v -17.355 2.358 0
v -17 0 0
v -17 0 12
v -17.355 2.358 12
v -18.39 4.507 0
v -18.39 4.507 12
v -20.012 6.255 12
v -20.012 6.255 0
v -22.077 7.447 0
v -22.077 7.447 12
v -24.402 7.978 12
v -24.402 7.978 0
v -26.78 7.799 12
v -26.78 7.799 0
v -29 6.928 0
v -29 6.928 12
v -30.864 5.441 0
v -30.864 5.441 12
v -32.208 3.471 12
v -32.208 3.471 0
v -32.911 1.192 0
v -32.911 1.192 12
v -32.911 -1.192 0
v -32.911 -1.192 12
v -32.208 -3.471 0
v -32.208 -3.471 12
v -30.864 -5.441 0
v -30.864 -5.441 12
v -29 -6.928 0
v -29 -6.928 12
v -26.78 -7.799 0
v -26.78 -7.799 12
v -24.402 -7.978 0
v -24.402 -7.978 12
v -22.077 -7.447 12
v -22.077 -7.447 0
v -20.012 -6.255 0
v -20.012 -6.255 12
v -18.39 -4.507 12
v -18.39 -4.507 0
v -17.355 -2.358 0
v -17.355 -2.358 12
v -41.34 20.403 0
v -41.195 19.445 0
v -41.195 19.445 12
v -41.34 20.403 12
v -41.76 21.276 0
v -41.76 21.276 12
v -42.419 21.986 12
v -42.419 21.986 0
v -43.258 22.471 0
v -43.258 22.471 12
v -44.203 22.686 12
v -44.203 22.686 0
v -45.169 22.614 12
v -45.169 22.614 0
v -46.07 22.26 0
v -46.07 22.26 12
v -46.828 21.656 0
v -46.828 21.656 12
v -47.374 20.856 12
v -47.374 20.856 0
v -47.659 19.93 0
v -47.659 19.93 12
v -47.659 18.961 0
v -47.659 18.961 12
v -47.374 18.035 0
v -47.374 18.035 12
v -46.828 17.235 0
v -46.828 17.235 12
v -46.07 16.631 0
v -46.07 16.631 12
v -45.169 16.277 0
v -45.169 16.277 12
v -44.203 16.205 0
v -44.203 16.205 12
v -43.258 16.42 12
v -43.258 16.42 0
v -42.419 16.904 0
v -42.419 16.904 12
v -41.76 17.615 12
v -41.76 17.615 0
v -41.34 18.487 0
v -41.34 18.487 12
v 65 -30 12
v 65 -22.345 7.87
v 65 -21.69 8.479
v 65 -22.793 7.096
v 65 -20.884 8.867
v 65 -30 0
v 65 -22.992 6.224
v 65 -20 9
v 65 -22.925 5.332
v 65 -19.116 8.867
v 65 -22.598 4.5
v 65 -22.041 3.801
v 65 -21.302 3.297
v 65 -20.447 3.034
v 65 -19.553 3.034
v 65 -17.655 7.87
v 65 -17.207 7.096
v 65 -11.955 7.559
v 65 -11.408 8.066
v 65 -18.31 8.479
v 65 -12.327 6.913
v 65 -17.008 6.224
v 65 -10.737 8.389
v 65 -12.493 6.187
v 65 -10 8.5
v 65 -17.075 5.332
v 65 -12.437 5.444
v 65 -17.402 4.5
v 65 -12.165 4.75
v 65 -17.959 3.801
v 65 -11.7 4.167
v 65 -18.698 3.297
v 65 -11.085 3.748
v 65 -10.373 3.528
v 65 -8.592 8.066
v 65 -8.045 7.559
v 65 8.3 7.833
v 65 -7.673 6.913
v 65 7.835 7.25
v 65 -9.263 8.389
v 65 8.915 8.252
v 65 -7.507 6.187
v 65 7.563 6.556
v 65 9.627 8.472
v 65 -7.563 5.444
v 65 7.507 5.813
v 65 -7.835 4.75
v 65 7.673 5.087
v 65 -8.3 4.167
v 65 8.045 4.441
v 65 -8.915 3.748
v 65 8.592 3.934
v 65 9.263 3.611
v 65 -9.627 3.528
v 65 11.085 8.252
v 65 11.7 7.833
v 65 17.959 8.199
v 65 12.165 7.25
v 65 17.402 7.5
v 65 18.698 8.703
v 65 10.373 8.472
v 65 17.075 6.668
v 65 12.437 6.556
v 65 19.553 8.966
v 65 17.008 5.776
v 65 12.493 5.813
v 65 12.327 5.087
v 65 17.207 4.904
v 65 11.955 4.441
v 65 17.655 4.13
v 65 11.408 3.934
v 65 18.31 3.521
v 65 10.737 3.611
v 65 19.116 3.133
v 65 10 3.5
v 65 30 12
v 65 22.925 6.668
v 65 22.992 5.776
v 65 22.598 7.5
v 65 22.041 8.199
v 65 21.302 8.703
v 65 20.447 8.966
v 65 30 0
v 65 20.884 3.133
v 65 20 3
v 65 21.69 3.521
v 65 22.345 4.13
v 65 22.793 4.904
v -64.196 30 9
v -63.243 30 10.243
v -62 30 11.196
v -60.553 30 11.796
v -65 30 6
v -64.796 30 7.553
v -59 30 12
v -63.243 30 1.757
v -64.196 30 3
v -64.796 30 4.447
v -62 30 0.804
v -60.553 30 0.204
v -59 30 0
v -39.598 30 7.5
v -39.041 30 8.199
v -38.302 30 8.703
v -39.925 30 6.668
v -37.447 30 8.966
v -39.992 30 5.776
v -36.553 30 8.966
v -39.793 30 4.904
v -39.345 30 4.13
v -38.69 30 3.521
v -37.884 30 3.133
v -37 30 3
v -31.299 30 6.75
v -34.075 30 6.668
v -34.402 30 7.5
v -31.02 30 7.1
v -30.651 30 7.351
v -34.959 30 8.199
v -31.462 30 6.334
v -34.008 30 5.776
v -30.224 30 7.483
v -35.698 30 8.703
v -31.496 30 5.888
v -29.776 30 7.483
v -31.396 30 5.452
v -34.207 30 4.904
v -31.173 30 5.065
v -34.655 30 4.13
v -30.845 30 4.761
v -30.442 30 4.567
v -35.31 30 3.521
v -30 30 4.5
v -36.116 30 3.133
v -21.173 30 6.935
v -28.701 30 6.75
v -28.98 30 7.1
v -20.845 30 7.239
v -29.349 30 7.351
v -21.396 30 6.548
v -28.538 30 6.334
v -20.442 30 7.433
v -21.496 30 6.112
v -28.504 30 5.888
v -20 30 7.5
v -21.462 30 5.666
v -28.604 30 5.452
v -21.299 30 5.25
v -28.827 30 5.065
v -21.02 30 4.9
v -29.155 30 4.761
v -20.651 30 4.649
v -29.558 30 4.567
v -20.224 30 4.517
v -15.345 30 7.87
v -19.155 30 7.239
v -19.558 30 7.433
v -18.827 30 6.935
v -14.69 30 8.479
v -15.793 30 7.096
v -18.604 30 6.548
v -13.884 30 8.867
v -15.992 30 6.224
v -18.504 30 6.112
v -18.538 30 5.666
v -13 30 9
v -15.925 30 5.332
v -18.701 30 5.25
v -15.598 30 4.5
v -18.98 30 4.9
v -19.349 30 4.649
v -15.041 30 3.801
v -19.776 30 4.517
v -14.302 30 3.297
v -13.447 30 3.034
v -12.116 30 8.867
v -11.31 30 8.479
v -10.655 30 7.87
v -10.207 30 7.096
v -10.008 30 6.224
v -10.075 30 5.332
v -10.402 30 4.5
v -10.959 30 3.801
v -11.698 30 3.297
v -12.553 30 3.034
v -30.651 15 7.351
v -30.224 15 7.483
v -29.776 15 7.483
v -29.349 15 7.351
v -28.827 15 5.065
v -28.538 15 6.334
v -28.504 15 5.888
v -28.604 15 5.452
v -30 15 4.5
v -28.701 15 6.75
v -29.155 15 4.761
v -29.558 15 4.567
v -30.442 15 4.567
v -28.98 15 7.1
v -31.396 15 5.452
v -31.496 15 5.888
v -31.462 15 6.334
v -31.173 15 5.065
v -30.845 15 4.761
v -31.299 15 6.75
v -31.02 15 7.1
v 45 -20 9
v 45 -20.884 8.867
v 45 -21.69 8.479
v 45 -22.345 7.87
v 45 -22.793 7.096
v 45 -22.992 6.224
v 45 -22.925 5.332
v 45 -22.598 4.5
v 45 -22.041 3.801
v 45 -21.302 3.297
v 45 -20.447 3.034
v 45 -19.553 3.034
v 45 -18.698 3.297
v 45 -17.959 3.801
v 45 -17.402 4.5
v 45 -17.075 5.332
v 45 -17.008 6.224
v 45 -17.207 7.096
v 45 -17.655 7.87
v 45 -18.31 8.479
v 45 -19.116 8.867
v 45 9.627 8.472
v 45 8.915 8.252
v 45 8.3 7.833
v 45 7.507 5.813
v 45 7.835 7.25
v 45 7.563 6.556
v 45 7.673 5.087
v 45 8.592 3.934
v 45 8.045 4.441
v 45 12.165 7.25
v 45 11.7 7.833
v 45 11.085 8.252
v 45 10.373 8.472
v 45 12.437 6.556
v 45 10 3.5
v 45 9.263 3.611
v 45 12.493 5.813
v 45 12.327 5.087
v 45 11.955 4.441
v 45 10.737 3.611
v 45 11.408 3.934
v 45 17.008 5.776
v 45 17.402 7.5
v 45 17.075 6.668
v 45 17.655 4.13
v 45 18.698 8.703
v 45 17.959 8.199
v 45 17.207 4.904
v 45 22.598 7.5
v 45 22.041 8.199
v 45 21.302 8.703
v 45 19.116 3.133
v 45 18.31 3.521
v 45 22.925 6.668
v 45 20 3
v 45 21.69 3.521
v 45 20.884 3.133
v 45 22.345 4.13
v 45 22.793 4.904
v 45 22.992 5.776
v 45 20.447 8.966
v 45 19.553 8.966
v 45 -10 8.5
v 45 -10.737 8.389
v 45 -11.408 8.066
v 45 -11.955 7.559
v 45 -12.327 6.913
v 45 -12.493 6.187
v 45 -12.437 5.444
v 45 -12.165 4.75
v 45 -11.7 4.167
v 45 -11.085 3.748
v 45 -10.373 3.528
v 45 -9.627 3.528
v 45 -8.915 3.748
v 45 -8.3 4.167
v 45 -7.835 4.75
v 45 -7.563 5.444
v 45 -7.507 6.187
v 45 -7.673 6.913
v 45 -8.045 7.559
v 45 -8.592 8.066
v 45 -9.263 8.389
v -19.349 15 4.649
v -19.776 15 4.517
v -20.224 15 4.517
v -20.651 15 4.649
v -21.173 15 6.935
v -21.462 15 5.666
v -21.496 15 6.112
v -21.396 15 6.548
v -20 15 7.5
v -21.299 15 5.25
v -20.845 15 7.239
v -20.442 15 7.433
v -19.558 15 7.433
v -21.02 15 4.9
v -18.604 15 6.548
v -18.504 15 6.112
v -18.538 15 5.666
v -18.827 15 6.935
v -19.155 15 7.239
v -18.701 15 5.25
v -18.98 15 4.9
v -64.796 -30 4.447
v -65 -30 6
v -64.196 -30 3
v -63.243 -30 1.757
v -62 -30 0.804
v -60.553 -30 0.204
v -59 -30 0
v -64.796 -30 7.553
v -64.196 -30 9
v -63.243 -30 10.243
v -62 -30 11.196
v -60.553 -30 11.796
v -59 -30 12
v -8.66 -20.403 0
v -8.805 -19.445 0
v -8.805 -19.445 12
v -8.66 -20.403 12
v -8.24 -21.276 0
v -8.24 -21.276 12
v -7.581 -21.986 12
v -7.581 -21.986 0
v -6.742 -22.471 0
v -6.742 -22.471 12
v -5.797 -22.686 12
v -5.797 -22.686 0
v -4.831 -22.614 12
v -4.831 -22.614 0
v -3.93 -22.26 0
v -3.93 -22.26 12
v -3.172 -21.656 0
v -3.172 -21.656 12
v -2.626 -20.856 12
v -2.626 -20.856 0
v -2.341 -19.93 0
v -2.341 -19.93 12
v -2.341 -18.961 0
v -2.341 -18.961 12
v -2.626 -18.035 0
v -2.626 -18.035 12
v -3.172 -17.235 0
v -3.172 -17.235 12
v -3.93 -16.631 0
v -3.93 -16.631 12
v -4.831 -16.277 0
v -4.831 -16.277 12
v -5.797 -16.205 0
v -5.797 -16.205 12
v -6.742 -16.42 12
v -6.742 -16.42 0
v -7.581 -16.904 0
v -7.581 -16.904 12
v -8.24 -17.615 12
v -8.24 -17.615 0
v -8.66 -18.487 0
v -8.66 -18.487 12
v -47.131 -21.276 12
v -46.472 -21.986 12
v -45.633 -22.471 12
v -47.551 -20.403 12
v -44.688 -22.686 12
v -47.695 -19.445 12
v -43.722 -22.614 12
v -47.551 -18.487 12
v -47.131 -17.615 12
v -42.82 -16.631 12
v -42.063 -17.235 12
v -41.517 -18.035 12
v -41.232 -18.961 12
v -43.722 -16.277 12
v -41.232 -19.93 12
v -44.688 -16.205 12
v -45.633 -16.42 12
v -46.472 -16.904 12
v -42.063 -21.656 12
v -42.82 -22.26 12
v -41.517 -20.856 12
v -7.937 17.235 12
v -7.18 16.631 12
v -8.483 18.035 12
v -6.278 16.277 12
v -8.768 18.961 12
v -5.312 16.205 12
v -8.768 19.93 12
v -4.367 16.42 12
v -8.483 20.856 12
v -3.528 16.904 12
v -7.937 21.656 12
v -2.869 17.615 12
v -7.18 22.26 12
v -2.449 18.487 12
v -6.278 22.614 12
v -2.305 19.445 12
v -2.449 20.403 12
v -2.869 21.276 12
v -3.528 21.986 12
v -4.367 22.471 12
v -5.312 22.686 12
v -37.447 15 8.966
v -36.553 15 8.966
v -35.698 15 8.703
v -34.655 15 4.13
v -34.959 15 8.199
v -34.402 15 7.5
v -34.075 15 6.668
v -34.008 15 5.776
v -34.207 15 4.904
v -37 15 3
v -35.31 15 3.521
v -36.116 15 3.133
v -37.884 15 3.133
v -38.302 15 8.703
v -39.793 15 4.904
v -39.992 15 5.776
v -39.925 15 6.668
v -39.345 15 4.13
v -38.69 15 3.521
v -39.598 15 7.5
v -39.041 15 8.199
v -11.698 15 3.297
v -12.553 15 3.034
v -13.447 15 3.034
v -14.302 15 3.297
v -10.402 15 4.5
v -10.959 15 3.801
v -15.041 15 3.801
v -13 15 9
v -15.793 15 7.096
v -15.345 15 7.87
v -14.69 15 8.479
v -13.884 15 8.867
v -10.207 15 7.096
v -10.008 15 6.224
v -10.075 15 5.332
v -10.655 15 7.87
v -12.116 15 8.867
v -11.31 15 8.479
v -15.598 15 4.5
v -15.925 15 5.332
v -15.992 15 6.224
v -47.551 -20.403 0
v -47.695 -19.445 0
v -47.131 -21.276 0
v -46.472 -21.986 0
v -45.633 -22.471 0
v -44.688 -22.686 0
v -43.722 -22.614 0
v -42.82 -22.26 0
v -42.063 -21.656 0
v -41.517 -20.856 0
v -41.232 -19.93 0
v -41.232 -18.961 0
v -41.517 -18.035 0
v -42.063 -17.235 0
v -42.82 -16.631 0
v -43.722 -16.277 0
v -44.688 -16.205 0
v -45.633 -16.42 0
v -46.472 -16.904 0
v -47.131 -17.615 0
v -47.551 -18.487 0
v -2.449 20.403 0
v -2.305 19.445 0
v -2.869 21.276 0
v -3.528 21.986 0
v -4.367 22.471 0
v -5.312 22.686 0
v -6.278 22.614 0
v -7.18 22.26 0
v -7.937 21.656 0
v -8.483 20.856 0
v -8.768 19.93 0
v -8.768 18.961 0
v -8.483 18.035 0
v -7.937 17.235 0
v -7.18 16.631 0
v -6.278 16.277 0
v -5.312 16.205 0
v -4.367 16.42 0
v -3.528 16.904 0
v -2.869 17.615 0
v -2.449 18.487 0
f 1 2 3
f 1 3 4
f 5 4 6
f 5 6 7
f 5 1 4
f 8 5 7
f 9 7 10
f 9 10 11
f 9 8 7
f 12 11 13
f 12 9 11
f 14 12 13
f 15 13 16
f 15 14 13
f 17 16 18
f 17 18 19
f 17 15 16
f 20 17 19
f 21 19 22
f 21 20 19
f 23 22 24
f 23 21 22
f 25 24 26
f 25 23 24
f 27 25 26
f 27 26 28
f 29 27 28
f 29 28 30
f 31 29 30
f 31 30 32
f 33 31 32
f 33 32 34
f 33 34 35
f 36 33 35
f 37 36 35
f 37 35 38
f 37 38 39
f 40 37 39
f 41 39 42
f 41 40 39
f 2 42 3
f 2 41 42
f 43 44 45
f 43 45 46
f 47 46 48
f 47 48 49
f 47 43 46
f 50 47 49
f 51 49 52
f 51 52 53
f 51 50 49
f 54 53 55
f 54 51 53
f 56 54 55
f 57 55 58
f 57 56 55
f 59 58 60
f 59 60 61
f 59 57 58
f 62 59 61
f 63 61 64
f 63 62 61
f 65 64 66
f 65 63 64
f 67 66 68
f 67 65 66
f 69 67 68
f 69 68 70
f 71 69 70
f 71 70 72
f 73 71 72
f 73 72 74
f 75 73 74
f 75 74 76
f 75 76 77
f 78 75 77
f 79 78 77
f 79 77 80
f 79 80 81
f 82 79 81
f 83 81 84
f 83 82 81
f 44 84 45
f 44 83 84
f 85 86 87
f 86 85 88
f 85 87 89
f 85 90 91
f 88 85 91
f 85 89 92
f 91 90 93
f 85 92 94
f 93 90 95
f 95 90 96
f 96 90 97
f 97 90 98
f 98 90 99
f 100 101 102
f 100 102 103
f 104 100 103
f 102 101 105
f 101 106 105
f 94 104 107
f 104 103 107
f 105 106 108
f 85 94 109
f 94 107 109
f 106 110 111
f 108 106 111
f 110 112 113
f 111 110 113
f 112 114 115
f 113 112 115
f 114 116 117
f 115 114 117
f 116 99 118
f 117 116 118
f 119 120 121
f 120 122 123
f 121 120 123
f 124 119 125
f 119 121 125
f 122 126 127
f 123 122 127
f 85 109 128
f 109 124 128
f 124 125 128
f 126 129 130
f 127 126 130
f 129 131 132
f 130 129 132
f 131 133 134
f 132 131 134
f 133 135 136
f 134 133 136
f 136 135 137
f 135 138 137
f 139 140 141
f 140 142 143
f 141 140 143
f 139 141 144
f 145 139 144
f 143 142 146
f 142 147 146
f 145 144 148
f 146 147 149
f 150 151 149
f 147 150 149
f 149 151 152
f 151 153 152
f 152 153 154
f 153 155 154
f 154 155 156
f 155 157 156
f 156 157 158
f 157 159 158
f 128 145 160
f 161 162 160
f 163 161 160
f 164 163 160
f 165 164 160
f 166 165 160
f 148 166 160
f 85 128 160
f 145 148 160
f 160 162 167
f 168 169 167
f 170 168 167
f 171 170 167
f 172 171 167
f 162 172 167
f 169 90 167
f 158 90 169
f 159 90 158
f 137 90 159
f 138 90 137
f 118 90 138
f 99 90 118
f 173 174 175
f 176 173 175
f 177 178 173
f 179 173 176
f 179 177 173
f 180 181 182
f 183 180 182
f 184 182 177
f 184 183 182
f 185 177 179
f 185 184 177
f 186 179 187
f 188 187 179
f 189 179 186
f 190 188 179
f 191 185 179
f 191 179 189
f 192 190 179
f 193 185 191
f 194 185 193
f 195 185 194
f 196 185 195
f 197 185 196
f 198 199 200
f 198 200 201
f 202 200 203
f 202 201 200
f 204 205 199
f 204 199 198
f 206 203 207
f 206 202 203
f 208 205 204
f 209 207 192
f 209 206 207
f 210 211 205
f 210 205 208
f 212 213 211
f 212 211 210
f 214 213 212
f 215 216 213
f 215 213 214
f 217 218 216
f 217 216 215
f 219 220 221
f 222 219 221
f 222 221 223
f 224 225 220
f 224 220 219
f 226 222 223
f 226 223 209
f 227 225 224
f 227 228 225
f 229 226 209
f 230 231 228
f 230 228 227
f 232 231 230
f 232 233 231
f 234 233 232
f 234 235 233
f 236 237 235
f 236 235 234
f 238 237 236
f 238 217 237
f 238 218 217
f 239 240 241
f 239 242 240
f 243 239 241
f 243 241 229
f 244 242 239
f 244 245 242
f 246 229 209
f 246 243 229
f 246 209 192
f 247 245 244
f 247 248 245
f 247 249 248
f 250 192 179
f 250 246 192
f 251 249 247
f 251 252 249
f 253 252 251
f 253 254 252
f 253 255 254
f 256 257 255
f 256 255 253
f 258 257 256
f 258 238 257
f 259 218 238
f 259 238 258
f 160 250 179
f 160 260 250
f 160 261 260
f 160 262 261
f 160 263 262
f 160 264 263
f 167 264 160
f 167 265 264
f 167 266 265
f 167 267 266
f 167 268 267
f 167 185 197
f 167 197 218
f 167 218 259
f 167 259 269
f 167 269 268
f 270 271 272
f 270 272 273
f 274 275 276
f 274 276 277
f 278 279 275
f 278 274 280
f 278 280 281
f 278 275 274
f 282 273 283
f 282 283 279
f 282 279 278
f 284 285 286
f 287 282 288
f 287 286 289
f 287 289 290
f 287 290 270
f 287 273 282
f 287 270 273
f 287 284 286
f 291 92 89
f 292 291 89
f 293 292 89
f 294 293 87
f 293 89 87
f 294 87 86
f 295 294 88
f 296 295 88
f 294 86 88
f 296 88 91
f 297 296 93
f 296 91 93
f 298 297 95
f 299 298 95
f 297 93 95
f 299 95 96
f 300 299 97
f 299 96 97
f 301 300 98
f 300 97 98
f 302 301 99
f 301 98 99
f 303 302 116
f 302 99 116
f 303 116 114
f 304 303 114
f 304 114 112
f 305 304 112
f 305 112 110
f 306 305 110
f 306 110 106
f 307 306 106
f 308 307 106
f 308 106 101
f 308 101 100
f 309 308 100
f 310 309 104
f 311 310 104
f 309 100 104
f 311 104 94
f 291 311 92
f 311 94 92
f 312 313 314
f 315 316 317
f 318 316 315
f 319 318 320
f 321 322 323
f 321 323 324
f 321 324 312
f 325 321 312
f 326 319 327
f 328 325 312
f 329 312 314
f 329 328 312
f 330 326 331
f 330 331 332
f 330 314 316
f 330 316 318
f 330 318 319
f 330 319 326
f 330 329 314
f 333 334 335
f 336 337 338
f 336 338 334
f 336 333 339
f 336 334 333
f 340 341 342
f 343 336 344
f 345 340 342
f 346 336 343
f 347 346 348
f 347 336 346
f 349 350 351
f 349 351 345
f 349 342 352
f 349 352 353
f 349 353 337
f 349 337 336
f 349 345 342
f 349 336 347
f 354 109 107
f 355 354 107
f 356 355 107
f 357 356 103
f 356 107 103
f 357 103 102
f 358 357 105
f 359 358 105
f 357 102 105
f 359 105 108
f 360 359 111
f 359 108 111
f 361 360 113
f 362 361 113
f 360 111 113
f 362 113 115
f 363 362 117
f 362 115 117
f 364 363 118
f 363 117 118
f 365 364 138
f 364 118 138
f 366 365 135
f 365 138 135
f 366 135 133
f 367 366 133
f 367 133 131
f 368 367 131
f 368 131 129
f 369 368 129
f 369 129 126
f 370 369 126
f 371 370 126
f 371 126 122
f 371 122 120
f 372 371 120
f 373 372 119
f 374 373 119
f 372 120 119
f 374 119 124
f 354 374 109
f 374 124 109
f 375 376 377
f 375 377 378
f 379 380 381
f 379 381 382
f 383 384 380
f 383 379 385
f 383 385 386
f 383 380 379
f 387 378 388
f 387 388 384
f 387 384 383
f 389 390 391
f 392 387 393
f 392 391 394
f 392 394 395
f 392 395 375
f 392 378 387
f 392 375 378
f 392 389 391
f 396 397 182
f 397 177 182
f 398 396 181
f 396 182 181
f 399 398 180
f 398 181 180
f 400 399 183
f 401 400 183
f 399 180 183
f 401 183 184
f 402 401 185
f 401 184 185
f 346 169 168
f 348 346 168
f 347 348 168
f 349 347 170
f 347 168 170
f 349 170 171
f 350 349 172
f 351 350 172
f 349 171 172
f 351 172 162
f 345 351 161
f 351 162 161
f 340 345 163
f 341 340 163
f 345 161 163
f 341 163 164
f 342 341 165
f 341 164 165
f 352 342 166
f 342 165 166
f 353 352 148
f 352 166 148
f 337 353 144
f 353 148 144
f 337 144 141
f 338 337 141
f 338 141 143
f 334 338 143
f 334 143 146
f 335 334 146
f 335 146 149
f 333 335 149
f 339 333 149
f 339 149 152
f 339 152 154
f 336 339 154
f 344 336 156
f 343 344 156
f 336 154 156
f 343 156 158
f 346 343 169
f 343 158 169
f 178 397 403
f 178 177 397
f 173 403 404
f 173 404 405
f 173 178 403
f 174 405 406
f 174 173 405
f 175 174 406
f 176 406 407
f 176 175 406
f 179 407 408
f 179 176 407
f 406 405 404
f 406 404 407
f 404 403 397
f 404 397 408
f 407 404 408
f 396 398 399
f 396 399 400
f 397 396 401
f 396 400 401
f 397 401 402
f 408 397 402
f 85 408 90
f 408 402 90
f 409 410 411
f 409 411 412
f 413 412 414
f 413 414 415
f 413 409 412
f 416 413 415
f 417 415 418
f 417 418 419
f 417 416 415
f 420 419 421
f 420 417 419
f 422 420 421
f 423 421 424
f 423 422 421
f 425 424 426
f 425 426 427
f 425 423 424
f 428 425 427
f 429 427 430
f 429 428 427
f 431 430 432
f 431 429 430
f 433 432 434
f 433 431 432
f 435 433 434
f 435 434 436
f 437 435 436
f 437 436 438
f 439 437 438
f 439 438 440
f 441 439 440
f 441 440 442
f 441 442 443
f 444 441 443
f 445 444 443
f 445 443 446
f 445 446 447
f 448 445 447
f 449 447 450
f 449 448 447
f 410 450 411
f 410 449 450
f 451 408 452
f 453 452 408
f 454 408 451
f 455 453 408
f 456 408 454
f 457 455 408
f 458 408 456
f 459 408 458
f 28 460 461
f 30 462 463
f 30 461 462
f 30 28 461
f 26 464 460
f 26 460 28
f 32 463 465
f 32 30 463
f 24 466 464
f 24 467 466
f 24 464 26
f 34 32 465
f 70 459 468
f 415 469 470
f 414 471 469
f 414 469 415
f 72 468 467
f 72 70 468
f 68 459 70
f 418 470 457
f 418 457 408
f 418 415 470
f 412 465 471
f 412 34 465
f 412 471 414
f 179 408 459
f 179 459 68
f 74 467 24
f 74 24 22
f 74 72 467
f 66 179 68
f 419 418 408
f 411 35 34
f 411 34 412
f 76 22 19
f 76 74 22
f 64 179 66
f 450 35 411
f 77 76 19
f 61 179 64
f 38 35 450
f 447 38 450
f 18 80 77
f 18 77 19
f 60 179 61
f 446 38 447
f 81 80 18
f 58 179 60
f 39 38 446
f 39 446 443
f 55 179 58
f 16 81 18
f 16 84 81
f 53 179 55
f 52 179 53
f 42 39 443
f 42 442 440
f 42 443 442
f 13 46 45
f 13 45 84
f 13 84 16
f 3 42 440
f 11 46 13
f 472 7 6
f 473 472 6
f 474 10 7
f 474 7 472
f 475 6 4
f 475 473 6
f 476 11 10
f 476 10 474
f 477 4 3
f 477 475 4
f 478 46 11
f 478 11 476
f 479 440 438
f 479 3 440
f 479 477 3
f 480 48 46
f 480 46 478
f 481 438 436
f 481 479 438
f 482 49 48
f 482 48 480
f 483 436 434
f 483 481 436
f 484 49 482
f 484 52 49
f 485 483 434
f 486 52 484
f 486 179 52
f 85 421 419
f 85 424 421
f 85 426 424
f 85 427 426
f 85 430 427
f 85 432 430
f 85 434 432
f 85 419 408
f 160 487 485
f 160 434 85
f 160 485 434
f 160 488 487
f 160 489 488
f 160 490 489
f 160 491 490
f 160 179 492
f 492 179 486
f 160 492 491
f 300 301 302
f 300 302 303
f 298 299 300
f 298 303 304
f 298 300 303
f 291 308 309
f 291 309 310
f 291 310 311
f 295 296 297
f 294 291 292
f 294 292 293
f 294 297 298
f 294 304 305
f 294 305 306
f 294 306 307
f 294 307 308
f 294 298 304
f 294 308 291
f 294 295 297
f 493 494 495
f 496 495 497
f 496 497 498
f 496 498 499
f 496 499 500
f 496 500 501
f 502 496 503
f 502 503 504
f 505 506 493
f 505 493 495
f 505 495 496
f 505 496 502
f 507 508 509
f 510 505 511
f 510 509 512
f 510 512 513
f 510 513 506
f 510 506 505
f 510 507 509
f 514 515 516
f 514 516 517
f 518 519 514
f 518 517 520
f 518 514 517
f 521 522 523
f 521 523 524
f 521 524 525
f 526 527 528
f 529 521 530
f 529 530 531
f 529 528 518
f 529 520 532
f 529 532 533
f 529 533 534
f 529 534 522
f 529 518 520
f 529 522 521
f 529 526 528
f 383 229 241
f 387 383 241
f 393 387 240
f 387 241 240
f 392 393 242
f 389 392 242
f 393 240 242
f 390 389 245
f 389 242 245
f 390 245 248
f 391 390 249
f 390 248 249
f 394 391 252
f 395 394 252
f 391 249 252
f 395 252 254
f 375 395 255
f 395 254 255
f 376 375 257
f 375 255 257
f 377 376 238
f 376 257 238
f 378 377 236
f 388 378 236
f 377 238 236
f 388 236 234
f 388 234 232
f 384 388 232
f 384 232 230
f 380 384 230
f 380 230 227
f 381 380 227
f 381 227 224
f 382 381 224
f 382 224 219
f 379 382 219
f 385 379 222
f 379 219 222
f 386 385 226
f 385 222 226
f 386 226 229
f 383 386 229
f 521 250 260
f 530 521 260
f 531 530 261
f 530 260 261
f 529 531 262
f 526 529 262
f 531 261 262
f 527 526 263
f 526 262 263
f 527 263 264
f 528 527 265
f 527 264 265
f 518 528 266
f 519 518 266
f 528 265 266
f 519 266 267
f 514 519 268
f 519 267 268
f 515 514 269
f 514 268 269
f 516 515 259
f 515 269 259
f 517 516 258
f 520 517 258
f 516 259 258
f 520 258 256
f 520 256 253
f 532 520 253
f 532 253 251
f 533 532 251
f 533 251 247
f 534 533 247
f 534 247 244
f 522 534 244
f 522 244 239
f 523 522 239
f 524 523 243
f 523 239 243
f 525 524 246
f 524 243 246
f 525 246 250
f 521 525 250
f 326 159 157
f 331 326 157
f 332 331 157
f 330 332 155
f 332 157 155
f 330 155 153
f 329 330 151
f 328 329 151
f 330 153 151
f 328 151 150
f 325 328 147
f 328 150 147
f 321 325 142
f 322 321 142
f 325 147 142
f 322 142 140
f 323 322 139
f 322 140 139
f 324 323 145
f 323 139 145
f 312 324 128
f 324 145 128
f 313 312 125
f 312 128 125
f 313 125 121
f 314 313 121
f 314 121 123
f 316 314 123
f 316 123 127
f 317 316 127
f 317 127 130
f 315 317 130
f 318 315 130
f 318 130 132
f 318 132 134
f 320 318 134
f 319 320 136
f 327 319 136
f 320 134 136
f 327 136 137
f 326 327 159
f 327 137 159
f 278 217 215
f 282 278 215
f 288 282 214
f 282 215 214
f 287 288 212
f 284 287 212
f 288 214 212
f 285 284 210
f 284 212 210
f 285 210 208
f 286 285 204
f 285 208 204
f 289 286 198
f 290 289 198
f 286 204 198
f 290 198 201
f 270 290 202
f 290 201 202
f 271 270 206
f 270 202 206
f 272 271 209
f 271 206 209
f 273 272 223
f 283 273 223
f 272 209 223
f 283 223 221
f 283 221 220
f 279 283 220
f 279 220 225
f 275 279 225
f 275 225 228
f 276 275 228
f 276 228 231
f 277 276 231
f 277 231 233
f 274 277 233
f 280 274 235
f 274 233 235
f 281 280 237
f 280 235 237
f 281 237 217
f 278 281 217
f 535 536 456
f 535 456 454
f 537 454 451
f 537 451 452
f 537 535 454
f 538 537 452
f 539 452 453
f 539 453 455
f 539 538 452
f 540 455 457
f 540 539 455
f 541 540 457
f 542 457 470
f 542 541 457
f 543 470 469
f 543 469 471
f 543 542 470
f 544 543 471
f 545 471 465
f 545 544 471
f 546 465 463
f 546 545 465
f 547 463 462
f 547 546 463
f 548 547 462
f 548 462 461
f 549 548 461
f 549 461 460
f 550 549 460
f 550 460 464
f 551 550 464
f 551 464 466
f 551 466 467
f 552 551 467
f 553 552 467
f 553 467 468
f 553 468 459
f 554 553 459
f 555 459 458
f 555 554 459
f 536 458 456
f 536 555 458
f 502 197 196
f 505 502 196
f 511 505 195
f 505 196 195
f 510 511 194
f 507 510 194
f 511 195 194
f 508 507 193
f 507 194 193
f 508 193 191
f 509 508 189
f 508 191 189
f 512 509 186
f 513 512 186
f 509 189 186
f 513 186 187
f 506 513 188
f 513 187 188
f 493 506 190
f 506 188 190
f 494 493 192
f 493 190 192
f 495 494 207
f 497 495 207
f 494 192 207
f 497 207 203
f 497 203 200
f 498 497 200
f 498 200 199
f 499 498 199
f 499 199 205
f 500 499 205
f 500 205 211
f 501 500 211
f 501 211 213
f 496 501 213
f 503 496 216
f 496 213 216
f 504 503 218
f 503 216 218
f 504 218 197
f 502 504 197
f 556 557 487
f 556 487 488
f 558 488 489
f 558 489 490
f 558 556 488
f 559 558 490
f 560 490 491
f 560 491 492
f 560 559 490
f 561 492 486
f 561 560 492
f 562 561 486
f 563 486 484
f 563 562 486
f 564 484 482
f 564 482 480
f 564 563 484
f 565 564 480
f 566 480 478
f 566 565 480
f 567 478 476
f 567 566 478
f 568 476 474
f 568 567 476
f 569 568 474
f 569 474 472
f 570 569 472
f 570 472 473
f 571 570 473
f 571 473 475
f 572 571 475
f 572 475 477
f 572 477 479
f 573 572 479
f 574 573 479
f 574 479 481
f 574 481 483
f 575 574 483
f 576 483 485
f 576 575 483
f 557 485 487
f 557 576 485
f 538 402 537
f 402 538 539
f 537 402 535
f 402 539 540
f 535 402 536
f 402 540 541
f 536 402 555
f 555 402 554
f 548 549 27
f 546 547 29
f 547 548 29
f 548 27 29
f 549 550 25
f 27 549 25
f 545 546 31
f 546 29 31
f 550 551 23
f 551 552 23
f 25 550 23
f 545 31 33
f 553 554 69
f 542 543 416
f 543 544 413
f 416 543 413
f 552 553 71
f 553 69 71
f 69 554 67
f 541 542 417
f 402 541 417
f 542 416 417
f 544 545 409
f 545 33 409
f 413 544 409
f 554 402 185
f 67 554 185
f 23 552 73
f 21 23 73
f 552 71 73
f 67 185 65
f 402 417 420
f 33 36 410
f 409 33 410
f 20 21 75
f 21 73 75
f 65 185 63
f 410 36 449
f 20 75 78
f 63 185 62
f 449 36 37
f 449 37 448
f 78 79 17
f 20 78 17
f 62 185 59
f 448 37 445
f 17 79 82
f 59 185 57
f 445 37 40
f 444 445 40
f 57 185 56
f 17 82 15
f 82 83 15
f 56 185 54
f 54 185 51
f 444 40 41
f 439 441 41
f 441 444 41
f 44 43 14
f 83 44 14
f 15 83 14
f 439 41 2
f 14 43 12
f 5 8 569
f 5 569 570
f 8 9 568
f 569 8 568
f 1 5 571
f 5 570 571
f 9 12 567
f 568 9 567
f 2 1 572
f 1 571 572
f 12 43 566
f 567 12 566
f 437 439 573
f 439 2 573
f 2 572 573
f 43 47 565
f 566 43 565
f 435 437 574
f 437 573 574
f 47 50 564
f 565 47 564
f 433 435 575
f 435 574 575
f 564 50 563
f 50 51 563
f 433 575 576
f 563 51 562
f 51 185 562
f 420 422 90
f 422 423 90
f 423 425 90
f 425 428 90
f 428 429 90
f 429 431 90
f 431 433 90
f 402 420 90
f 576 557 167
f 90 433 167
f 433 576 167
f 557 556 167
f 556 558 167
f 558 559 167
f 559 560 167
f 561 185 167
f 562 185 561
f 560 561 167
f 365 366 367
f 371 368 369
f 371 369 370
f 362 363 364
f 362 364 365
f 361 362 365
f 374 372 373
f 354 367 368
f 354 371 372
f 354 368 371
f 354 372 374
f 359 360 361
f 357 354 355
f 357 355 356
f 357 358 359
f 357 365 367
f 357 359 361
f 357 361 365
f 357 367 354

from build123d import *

# Parameters (mm, degrees)
SKETCH1_W           = 130
SKETCH1_H           = 60
SKETCH1_R           = 8
SKETCH1_R_2         = 3.25
BOSS_EXTRUDE1_DEPTH = 12
FILLET1_R           = 6
SKETCH2_R           = 3
SKETCH2_R_2         = 2.5
CUT_EXTRUDE1_DEPTH  = 20
SKETCH3_R           = 3
SKETCH3_R_2         = 1.5
CUT_EXTRUDE2_DEPTH  = 15


with BuildPart() as part:
    # Sketch1 → Boss-Extrude1 (new body)
    with BuildSketch(Plane.XY):
        Rectangle(SKETCH1_W, SKETCH1_H)
        with Locations((-25, 0)):
            Circle(SKETCH1_R, mode=Mode.SUBTRACT)
        with Locations((-5.554563517, 19.445436483)):
            Circle(SKETCH1_R_2, mode=Mode.SUBTRACT)
        with Locations((-44.445436483, 19.445436483)):
            Circle(SKETCH1_R_2, mode=Mode.SUBTRACT)
        with Locations(Location((-44.445436483, -19.445436483, 0), (0, 0, 180))):
            Circle(SKETCH1_R_2, mode=Mode.SUBTRACT)
        with Locations(Location((-5.554563517, -19.445436483, 0), (0, 0, 180))):
            Circle(SKETCH1_R_2, mode=Mode.SUBTRACT)
    extrude(amount=BOSS_EXTRUDE1_DEPTH)

    # Fillet1
    fillet1_edges = [part.edges().sort_by_distance(p)[0] for p in [
        (-65, 0, 0),
        (-65, 0, 12),
    ]]
    fillet(fillet1_edges, radius=FILLET1_R - 0.0001)  # a hair under: the kernel refuses the full size

    # Sketch2 → Cut-Extrude1 (cut)
    with BuildSketch(Plane(origin=(65, 0, 0), x_dir=(0, 0, -1), z_dir=(1, 0, 0))):
        with Locations((-6, 20)):
            Circle(SKETCH2_R)
        with Locations((-6, 10)):
            Circle(SKETCH2_R_2)
        with Locations(Location((-6, -10, 0), (0, 0, 180))):
            Circle(SKETCH2_R_2)
        with Locations(Location((-6, -20, 0), (0, 0, 180))):
            Circle(SKETCH2_R)
    extrude(amount=-CUT_EXTRUDE1_DEPTH, mode=Mode.SUBTRACT)

    # Sketch3 → Cut-Extrude2 (cut)
    with BuildSketch(Plane(origin=(0, 30, 0), x_dir=(1, 0, 0), z_dir=(0, 1, 0))):
        with Locations(Location((-13, -6, 0), (0, 0, 270))):
            Circle(SKETCH3_R)
        with Locations(Location((-20, -6, 0), (0, 0, 270))):
            Circle(SKETCH3_R_2)
        with Locations(Location((-30, -6, 0), (0, 0, 90))):
            Circle(SKETCH3_R_2)
        with Locations(Location((-37, -6, 0), (0, 0, 90))):
            Circle(SKETCH3_R)
    extrude(amount=-CUT_EXTRUDE2_DEPTH, mode=Mode.SUBTRACT)


solid = part.part
